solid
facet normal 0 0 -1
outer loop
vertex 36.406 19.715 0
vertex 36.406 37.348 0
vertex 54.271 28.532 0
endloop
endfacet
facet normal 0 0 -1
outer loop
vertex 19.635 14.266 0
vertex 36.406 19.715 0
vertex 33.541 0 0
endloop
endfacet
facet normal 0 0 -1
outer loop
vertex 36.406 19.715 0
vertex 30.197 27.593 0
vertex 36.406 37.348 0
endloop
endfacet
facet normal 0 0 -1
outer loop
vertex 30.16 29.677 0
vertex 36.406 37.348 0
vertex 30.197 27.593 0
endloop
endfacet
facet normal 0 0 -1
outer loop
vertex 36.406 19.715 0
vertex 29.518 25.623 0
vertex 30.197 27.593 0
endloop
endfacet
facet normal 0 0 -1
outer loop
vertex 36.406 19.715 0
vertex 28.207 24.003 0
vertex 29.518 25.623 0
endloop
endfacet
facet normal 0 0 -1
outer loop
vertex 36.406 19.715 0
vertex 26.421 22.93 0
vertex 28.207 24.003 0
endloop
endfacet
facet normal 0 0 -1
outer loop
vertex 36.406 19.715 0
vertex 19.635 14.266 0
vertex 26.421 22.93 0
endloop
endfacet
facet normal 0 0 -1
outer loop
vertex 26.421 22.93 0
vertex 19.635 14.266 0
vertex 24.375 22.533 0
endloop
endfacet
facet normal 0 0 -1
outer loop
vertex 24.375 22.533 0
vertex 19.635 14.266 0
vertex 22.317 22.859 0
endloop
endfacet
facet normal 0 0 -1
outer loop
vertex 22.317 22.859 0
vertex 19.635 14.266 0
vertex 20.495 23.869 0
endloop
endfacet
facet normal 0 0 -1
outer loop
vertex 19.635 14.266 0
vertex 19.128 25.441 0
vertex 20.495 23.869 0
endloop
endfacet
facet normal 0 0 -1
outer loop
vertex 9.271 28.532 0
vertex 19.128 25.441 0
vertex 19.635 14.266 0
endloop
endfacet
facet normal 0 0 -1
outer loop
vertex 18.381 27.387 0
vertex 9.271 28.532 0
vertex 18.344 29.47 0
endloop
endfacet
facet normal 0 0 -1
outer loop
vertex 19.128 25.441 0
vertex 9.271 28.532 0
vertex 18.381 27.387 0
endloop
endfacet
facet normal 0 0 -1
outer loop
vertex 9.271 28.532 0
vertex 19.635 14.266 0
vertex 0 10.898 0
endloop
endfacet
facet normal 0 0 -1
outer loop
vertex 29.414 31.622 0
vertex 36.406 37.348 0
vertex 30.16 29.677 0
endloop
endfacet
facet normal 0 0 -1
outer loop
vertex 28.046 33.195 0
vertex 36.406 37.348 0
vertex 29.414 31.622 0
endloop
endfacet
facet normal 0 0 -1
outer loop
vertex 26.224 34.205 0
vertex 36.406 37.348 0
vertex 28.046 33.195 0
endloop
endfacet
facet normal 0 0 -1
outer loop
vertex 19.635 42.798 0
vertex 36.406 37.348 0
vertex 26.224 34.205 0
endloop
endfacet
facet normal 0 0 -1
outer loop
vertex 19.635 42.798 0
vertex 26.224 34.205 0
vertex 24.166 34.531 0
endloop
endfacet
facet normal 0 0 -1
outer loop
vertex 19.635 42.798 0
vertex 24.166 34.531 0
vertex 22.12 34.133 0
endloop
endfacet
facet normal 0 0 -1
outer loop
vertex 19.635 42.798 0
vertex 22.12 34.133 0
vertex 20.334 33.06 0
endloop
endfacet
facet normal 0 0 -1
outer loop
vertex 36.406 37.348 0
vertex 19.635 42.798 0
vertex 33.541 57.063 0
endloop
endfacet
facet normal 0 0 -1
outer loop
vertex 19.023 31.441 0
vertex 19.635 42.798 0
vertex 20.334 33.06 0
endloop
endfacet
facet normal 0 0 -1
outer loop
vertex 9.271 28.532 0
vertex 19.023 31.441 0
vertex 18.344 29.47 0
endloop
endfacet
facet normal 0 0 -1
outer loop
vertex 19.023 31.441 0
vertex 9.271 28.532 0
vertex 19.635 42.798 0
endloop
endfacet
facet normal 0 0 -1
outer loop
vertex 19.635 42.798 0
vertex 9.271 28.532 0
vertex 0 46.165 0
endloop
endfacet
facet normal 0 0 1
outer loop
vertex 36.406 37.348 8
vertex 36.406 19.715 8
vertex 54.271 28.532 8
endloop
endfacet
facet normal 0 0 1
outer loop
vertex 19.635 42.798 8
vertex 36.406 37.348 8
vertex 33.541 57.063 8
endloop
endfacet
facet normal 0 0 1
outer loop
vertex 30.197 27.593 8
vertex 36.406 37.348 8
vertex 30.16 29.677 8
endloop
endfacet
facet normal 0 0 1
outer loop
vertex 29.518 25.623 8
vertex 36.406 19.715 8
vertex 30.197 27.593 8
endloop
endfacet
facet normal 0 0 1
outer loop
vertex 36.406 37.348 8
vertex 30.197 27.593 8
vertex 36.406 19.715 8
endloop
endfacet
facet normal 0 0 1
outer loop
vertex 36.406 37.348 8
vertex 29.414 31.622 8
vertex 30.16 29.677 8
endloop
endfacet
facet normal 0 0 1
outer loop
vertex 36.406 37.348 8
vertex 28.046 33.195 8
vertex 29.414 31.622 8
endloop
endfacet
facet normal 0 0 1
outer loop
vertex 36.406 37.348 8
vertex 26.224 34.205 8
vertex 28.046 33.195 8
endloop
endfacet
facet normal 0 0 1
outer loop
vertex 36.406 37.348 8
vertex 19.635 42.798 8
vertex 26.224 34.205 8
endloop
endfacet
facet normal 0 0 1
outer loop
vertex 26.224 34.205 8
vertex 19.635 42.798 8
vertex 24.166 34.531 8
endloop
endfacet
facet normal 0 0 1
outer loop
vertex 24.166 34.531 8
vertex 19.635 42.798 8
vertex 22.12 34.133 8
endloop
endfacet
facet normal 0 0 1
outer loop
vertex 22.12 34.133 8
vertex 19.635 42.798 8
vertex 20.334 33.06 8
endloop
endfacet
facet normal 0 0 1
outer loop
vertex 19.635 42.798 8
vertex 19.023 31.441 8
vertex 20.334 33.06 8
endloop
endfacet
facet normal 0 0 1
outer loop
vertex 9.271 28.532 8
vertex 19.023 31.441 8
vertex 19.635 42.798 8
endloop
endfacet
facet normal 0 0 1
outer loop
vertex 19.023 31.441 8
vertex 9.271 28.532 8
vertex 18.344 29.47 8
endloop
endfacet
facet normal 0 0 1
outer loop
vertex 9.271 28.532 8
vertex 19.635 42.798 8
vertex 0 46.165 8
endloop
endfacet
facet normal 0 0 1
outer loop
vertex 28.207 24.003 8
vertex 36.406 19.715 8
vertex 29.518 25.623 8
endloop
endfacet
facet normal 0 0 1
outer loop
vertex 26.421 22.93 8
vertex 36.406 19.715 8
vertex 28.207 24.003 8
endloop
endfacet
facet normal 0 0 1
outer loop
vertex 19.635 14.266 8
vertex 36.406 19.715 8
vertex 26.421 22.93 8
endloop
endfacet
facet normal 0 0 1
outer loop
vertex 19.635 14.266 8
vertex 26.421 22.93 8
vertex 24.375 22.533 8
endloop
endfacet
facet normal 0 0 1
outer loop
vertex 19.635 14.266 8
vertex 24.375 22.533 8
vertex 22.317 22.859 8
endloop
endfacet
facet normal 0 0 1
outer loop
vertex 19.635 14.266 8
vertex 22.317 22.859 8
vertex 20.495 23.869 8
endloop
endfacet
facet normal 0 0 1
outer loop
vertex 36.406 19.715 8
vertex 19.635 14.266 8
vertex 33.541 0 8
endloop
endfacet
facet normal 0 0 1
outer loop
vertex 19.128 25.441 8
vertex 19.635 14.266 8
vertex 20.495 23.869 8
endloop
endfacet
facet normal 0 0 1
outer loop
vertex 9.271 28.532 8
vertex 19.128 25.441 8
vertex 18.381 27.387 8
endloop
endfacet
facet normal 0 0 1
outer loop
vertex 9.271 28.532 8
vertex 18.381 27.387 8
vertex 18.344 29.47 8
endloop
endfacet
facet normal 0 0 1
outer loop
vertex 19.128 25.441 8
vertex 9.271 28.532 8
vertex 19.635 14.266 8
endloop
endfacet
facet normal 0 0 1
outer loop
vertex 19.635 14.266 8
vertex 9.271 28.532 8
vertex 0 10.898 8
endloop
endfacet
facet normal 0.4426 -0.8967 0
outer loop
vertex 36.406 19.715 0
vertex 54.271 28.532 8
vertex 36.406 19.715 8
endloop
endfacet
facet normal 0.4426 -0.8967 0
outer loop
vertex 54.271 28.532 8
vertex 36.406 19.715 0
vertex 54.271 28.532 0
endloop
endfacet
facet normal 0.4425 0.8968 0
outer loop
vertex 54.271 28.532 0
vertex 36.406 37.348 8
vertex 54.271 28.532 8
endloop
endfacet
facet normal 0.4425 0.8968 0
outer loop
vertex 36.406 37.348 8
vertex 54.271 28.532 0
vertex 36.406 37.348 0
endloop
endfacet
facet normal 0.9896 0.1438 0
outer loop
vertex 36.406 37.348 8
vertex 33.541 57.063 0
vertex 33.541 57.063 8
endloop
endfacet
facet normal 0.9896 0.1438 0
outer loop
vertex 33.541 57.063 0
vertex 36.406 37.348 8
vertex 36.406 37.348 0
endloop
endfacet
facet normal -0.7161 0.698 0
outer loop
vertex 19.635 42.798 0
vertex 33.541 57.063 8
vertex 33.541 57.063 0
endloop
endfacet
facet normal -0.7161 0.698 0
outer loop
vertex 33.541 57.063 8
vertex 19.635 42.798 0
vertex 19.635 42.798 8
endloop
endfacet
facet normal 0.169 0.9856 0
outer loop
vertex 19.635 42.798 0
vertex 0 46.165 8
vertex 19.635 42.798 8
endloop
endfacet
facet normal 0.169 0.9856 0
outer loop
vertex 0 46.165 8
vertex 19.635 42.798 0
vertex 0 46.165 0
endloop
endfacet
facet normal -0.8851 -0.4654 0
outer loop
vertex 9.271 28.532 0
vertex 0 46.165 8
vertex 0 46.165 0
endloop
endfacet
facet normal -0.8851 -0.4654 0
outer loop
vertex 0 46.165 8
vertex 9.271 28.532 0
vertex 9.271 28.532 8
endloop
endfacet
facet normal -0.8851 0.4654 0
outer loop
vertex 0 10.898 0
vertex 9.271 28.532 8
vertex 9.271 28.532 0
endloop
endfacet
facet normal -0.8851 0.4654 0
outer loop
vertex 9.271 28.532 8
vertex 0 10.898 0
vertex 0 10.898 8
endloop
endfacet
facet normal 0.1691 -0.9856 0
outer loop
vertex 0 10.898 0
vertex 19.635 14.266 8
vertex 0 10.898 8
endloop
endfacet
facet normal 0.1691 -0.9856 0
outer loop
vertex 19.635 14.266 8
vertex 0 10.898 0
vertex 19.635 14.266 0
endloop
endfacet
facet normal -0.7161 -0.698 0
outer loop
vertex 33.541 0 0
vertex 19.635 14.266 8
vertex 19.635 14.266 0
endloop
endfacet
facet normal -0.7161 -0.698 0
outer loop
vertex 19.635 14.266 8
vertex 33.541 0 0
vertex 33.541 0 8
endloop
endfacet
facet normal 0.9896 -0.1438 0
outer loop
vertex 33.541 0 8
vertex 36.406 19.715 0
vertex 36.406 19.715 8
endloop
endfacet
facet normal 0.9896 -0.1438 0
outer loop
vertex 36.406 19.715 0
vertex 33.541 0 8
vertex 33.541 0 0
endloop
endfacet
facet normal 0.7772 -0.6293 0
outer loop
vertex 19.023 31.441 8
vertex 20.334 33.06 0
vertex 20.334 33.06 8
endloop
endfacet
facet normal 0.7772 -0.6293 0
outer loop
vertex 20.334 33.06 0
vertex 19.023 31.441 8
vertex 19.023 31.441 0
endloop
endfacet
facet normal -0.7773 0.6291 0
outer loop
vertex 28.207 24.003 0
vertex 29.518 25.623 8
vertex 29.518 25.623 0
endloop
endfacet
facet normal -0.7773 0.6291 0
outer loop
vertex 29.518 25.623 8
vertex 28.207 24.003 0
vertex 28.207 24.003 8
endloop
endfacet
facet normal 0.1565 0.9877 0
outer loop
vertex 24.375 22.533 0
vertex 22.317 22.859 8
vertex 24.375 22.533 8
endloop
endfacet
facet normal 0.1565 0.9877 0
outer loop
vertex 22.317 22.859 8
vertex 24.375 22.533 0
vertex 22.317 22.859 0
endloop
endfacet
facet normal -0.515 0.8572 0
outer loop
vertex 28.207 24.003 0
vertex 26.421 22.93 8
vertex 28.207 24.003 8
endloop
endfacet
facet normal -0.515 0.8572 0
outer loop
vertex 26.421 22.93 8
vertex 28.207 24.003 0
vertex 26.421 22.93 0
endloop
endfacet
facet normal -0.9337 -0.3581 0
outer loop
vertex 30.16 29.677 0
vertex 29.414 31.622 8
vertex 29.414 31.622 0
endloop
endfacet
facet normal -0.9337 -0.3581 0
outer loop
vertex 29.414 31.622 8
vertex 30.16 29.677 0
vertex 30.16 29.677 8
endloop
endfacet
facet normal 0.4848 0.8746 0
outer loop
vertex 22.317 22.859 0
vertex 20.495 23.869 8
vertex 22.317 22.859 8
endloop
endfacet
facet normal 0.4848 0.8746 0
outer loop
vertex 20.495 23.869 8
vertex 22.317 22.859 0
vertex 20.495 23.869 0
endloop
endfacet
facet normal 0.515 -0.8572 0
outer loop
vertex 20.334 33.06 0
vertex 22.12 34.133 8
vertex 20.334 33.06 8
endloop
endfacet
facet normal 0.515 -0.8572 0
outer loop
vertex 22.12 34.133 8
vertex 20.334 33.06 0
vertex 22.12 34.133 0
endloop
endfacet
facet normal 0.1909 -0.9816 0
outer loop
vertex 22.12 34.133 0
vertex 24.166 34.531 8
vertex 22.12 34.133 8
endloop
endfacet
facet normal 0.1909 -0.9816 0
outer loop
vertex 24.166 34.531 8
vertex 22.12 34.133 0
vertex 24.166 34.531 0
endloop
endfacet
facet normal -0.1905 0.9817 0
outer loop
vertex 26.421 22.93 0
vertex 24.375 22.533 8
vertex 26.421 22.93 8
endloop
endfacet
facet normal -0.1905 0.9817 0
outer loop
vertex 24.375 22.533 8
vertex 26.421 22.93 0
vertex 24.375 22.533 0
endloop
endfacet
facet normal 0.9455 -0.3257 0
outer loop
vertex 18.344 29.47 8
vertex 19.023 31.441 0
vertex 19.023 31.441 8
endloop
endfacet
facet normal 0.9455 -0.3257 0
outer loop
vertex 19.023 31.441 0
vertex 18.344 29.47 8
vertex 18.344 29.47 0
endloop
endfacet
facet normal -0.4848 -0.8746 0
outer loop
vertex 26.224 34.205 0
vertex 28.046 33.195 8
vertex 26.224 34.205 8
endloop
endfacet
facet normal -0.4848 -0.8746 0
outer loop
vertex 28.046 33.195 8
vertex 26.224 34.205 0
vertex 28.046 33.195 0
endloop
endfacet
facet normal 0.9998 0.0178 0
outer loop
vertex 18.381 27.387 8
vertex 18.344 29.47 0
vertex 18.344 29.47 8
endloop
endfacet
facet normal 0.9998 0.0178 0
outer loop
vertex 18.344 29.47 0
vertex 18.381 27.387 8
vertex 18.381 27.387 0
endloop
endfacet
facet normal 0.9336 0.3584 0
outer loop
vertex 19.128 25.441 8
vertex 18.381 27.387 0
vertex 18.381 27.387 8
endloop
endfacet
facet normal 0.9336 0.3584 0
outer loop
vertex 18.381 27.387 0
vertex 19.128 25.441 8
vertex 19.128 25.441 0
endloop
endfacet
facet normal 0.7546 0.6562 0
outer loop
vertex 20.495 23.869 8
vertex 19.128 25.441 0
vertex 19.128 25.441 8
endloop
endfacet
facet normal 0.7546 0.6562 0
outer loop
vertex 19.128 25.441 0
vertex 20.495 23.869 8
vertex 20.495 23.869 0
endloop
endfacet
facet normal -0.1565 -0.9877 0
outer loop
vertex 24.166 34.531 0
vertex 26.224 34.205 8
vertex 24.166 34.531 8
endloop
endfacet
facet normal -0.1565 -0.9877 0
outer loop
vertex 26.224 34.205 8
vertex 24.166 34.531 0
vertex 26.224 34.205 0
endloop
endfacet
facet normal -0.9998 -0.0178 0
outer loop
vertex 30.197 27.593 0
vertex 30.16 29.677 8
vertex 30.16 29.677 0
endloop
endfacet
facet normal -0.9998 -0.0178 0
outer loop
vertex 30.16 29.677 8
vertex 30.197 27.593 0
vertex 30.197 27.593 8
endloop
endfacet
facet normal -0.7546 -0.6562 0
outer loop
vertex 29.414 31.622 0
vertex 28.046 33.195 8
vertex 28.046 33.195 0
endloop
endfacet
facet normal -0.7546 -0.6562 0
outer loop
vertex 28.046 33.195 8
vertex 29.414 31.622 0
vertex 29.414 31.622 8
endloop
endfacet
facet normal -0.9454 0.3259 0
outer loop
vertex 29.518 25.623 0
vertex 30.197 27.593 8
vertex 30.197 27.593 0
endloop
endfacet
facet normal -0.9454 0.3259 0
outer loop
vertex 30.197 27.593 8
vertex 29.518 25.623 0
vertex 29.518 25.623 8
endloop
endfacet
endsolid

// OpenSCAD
$fn = 32;

// ----------------------------------------------------------------------
// Star wheel: 5-point star, R30
// ----------------------------------------------------------------------

// --- parameters (mm) ---
n_points = 5;             // number of points / teeth
r_out = 30;               // tip radius
r_in = 15;                // root radius
bore_r = 6;               // centre bore radius
plate_t = 8;              // plate thickness, Z (extrusion height)
bore_d = 12;              // centre bore diameter
fit_tol = 0.02;           // declared fit tolerance (prompt contract)
free_tol = 0.2;           // declared free tolerance (prompt contract)

profile = [[54.271, 28.532], [36.406, 37.348], [33.541, 57.063], [19.635, 42.798], [0, 46.165], [9.271, 28.532], [0, 10.898], [19.635, 14.266], [33.541, 0], [36.406, 19.715]];  // primary outline, 10 points, counter clockwise
void_1 = [[30.16, 29.677], [29.414, 31.622], [28.046, 33.195], [26.224, 34.205], [24.166, 34.531], [22.12, 34.133], [20.334, 33.06], [19.023, 31.441], [18.344, 29.47], [18.381, 27.387], [19.128, 25.441], [20.495, 23.869], [22.317, 22.859], [24.375, 22.533], [26.421, 22.93], [28.207, 24.003], [29.518, 25.623], [30.197, 27.593]];  // centre bore, 18 points

// --- the one profile operation ---
difference() {
  linear_extrude(height = plate_t) polygon(points = profile);
  translate([0, 0, -1])
    linear_extrude(height = plate_t + 2) polygon(points = void_1);
}
